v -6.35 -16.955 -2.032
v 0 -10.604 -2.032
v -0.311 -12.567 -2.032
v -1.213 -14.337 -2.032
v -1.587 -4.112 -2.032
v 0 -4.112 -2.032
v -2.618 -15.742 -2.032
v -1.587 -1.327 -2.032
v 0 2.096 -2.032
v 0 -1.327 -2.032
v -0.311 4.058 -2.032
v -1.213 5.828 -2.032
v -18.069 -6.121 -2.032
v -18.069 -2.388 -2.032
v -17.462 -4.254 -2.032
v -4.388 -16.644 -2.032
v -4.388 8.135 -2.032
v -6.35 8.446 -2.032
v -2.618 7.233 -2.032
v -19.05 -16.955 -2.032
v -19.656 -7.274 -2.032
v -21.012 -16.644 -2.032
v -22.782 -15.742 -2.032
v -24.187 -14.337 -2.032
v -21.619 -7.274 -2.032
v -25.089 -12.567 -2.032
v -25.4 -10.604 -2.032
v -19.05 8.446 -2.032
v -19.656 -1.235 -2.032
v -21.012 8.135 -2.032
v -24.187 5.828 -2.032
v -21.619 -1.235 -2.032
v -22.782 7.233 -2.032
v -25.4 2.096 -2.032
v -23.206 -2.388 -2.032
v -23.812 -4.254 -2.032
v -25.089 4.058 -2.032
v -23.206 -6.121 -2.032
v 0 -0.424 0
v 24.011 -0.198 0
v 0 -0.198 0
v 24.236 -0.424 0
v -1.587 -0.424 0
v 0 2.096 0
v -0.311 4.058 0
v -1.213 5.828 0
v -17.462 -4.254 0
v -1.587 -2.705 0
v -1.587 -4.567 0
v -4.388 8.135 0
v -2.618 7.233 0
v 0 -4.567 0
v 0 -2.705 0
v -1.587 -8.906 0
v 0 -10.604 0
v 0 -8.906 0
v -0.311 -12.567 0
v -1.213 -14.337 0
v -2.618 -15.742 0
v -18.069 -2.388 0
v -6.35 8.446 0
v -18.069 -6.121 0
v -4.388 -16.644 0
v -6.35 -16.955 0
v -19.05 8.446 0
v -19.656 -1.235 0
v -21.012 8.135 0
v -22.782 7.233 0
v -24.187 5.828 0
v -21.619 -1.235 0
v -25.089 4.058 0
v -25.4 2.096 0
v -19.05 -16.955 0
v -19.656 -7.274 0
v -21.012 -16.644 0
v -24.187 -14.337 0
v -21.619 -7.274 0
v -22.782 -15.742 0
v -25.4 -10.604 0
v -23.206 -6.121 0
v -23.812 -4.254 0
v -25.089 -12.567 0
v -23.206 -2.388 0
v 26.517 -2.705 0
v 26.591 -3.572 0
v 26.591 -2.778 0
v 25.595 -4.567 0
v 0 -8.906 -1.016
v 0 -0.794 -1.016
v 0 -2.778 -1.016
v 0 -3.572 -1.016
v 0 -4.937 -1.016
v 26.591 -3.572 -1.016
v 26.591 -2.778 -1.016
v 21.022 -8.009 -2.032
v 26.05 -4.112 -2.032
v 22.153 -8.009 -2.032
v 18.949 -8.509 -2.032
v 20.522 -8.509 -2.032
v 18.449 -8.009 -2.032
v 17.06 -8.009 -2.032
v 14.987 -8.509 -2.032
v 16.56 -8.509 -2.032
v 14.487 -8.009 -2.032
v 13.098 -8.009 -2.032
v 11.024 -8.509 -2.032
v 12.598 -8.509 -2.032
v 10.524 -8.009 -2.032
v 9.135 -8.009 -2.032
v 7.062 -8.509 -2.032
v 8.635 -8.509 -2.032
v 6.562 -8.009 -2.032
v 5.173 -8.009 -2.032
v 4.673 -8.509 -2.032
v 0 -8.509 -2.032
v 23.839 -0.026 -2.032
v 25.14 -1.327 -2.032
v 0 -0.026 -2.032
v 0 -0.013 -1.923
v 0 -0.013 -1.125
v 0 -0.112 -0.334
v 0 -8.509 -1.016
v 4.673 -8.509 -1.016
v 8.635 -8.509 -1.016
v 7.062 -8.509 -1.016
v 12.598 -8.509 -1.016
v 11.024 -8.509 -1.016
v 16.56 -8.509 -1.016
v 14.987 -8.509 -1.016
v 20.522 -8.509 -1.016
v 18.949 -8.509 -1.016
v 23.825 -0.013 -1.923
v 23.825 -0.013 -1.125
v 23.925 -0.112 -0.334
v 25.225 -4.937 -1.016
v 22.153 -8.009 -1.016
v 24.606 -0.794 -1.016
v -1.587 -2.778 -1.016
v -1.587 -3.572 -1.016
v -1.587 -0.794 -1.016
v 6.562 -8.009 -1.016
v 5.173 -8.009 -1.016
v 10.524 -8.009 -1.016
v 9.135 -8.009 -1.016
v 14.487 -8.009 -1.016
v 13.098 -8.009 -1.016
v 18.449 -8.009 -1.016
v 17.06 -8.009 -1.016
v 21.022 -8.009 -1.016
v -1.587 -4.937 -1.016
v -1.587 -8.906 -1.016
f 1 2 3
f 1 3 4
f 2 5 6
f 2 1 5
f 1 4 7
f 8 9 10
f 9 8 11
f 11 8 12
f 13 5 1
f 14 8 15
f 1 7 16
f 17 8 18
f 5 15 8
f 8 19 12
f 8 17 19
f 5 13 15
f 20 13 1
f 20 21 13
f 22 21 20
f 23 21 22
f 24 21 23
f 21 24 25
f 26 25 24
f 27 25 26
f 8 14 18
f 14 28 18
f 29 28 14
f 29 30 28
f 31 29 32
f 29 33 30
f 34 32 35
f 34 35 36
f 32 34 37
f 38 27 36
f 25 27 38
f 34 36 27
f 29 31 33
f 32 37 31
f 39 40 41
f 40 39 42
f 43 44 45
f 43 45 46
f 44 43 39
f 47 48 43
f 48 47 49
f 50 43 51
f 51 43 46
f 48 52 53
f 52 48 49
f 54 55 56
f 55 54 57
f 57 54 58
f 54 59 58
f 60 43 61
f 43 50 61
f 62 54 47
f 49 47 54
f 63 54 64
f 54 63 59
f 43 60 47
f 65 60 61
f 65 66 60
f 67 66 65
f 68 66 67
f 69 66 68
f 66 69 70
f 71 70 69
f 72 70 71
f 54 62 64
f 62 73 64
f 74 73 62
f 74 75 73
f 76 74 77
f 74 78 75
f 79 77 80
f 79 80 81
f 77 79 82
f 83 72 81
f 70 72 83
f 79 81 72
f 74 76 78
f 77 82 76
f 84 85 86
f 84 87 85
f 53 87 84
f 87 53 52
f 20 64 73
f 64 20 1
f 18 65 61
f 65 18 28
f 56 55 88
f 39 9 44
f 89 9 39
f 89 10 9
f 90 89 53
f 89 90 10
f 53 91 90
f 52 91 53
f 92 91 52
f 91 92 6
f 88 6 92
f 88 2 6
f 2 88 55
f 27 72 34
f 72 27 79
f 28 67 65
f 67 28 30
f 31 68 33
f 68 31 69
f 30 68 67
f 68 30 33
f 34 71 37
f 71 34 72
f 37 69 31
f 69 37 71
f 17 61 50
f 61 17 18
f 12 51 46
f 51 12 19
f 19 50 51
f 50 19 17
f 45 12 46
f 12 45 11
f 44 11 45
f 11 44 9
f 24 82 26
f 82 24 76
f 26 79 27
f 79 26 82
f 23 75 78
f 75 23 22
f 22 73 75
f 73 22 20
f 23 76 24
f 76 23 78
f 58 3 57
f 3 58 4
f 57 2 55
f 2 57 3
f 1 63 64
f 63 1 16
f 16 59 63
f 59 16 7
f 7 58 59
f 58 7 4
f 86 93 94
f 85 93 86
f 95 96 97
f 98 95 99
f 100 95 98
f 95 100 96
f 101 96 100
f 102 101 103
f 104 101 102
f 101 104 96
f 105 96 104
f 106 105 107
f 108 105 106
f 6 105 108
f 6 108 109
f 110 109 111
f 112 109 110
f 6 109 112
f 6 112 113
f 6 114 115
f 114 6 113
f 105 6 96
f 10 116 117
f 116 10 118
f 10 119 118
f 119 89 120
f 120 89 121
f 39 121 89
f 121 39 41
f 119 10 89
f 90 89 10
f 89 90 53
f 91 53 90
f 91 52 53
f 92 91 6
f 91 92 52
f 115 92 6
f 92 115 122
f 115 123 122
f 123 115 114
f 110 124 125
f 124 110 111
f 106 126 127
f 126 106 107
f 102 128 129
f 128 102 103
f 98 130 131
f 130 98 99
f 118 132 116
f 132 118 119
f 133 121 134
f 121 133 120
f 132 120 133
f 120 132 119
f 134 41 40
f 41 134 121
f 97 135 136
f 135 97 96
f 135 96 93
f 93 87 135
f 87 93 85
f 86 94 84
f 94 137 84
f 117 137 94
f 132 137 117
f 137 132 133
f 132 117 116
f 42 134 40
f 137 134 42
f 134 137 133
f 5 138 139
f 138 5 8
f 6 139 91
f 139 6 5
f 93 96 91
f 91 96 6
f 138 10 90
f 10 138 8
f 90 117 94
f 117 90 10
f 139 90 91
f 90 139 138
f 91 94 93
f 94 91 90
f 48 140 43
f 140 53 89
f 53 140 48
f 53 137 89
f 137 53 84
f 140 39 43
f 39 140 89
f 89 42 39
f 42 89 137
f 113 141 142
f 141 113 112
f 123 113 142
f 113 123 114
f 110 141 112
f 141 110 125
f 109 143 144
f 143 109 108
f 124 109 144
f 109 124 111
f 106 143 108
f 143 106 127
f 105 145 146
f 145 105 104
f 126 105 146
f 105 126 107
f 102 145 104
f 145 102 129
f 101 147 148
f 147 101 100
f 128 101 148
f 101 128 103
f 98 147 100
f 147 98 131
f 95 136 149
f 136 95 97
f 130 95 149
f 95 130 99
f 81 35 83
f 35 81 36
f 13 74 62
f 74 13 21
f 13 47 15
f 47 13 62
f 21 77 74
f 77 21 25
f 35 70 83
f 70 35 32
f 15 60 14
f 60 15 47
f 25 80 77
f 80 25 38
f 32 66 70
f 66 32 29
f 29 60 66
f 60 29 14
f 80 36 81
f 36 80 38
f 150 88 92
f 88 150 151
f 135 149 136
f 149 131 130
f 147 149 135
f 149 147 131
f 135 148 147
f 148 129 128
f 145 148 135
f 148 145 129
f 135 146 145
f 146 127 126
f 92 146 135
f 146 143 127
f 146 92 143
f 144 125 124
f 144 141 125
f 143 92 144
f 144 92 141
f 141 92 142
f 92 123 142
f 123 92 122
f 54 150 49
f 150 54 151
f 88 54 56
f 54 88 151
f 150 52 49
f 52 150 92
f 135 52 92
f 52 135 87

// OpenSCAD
// Physical Keygen - by Nirav Patel <http://eclecti.cc>
//
// Generate a duplicate of a Schlage SC1 key by editing the last line of the file
// and entering in the key code of the lock.  If you don't know the key code,
// you can measure the key and compare the numbers at:
// http://web.archive.org/web/20050217020917fw_/http://dlaco.com/spacing/tips.htm
//
// This work is licensed under a Creative Commons Attribution 3.0 Unported License.

// Since the keys and locks I have were all designed in imperial units, the
// constants in this file will be defined in inches.  The mm function
// allows us to retain the proper size for exporting a metric ST
//1st number of key code
a = 0;
//2nd number of key code
b = 0;
//3rd number of key code
c = 0;
//4th number of key code
d = 0;
//5th number of key code
e = 0;
function mm(i) = i*25.4;

module rounded(size, r) {
    union() {
        translate([r, 0, 0]) cube([size[0]-2*r, size[1], size[2]]);
        translate([0, r, 0]) cube([size[0], size[1]-2*r, size[2]]);
        translate([r, r, 0]) cylinder(h=size[2], r=r);
        translate([size[0]-r, r, 0]) cylinder(h=size[2], r=r);
        translate([r, size[1]-r, 0]) cylinder(h=size[2], r=r);
        translate([size[0]-r, size[1]-r, 0]) cylinder(h=size[2], r=r);
    }
}

module bit() {
    w = mm(1/4);
    difference() {
        translate([-w/2, 0, 0]) cube([w, mm(1), w]);
        translate([-mm(7/256), 0, 0]) rotate([0, 0, 135]) cube([w, w, w]);
         translate([mm(7/256), 0, 0]) rotate([0, 0, -45]) cube([w, w, w]);
    }
}

// Schlage SC1 5 pin key.  The measurements are mostly guesses based on reverse
// engineering some keys I have and some publicly available information.
module sc1(bits) {
    // You may need to adjust these to fit your specific printer settings
    thickness = mm(0.080);
    length = mm(17/16);
    width = mm(.335);
    
    shoulder = mm(.231);
    pin_spacing = mm(.156);
    depth_inc = mm(.015);
    
    // A fudge factor.  Printing with your average RepRap, the bottom layer is
    // going to be squeezed larger than you want. You can make the pins
    // go slighly deeper by a fudge amount to make up for it if you aren't
    // adjusting for it elsewhere like Skeinforge or in your firmware.
    // 0.5mm works well for me.
    fudge = 0.5;
    
    // Handle size
    h_l = mm(1);
    h_w = mm(1);
    h_d = mm(1/16);
    difference() {
        // blade and key handle
        union() {
            translate([-h_l, -h_w/2 + width/2, 0]) rounded([h_l, h_w, thickness], mm(1/4));
            intersection() {
                // cut a little off the tip to avoid going too long
                cube([length - mm(1/64), width, thickness]);
                translate([0, mm(1/4), thickness*3/4]) rotate([0, 90, 0]) cylinder(h=length, r=mm(1/4), $fn=50);
            }
        }
        
        // chamfer the tip
        translate([length, mm(1/8), 0]) {
            rotate([0, 0, 45]) cube([10, 10, thickness]);
            rotate([0, 0, 225]) cube([10, 10, thickness]);
        }
        
        // put in a hole for keychain use
        translate([-h_l + mm(3/16), width/2, 0]) cylinder(h=thickness, r=mm(1/8));
        
        // cut the channels in the key.  designed more for printability than accuracy
        union() {
            translate([-h_d, mm(9/64), thickness/2]) rotate([62, 0, 0]) cube([length + h_d, width, width]);
            translate([-h_d, mm(7/64), thickness/2]) rotate([55, 0, 0]) cube([length + h_d, width, width]);
            translate([-h_d, mm(7/64), thickness/2]) cube([length + h_d, mm(1/32), width]);
        }
        
        translate([-h_d, width - mm(9/64), 0]) cube([length + h_d, width - (width - mm(10/64)), thickness/2]);
        translate([-h_d, width - mm(9/64), thickness/2]) rotate([-110, 0, 0]) cube([length + h_d, width, thickness/2]);
        
        intersection() {
            translate([-h_d, mm(1/32), thickness/2]) rotate([-118, 0, 0]) cube([length + h_d, width, width]);
            translate([-h_d, mm(1/32), thickness/2]) rotate([-110, 0, 0]) cube([length + h_d, width, width]);
        }
        
        // Do the actual bitting
        for (b = [0:4]) {
            translate([shoulder + b*pin_spacing, width - bits[b]*depth_inc - fudge, 0]) bit();
        }
    }
}

// This sample key goes to a lock that is sitting disassembled on my desk
// Flip the key over for easy printing

rotate([180, 0, 0]) sc1([a,b,c,d,e]);
